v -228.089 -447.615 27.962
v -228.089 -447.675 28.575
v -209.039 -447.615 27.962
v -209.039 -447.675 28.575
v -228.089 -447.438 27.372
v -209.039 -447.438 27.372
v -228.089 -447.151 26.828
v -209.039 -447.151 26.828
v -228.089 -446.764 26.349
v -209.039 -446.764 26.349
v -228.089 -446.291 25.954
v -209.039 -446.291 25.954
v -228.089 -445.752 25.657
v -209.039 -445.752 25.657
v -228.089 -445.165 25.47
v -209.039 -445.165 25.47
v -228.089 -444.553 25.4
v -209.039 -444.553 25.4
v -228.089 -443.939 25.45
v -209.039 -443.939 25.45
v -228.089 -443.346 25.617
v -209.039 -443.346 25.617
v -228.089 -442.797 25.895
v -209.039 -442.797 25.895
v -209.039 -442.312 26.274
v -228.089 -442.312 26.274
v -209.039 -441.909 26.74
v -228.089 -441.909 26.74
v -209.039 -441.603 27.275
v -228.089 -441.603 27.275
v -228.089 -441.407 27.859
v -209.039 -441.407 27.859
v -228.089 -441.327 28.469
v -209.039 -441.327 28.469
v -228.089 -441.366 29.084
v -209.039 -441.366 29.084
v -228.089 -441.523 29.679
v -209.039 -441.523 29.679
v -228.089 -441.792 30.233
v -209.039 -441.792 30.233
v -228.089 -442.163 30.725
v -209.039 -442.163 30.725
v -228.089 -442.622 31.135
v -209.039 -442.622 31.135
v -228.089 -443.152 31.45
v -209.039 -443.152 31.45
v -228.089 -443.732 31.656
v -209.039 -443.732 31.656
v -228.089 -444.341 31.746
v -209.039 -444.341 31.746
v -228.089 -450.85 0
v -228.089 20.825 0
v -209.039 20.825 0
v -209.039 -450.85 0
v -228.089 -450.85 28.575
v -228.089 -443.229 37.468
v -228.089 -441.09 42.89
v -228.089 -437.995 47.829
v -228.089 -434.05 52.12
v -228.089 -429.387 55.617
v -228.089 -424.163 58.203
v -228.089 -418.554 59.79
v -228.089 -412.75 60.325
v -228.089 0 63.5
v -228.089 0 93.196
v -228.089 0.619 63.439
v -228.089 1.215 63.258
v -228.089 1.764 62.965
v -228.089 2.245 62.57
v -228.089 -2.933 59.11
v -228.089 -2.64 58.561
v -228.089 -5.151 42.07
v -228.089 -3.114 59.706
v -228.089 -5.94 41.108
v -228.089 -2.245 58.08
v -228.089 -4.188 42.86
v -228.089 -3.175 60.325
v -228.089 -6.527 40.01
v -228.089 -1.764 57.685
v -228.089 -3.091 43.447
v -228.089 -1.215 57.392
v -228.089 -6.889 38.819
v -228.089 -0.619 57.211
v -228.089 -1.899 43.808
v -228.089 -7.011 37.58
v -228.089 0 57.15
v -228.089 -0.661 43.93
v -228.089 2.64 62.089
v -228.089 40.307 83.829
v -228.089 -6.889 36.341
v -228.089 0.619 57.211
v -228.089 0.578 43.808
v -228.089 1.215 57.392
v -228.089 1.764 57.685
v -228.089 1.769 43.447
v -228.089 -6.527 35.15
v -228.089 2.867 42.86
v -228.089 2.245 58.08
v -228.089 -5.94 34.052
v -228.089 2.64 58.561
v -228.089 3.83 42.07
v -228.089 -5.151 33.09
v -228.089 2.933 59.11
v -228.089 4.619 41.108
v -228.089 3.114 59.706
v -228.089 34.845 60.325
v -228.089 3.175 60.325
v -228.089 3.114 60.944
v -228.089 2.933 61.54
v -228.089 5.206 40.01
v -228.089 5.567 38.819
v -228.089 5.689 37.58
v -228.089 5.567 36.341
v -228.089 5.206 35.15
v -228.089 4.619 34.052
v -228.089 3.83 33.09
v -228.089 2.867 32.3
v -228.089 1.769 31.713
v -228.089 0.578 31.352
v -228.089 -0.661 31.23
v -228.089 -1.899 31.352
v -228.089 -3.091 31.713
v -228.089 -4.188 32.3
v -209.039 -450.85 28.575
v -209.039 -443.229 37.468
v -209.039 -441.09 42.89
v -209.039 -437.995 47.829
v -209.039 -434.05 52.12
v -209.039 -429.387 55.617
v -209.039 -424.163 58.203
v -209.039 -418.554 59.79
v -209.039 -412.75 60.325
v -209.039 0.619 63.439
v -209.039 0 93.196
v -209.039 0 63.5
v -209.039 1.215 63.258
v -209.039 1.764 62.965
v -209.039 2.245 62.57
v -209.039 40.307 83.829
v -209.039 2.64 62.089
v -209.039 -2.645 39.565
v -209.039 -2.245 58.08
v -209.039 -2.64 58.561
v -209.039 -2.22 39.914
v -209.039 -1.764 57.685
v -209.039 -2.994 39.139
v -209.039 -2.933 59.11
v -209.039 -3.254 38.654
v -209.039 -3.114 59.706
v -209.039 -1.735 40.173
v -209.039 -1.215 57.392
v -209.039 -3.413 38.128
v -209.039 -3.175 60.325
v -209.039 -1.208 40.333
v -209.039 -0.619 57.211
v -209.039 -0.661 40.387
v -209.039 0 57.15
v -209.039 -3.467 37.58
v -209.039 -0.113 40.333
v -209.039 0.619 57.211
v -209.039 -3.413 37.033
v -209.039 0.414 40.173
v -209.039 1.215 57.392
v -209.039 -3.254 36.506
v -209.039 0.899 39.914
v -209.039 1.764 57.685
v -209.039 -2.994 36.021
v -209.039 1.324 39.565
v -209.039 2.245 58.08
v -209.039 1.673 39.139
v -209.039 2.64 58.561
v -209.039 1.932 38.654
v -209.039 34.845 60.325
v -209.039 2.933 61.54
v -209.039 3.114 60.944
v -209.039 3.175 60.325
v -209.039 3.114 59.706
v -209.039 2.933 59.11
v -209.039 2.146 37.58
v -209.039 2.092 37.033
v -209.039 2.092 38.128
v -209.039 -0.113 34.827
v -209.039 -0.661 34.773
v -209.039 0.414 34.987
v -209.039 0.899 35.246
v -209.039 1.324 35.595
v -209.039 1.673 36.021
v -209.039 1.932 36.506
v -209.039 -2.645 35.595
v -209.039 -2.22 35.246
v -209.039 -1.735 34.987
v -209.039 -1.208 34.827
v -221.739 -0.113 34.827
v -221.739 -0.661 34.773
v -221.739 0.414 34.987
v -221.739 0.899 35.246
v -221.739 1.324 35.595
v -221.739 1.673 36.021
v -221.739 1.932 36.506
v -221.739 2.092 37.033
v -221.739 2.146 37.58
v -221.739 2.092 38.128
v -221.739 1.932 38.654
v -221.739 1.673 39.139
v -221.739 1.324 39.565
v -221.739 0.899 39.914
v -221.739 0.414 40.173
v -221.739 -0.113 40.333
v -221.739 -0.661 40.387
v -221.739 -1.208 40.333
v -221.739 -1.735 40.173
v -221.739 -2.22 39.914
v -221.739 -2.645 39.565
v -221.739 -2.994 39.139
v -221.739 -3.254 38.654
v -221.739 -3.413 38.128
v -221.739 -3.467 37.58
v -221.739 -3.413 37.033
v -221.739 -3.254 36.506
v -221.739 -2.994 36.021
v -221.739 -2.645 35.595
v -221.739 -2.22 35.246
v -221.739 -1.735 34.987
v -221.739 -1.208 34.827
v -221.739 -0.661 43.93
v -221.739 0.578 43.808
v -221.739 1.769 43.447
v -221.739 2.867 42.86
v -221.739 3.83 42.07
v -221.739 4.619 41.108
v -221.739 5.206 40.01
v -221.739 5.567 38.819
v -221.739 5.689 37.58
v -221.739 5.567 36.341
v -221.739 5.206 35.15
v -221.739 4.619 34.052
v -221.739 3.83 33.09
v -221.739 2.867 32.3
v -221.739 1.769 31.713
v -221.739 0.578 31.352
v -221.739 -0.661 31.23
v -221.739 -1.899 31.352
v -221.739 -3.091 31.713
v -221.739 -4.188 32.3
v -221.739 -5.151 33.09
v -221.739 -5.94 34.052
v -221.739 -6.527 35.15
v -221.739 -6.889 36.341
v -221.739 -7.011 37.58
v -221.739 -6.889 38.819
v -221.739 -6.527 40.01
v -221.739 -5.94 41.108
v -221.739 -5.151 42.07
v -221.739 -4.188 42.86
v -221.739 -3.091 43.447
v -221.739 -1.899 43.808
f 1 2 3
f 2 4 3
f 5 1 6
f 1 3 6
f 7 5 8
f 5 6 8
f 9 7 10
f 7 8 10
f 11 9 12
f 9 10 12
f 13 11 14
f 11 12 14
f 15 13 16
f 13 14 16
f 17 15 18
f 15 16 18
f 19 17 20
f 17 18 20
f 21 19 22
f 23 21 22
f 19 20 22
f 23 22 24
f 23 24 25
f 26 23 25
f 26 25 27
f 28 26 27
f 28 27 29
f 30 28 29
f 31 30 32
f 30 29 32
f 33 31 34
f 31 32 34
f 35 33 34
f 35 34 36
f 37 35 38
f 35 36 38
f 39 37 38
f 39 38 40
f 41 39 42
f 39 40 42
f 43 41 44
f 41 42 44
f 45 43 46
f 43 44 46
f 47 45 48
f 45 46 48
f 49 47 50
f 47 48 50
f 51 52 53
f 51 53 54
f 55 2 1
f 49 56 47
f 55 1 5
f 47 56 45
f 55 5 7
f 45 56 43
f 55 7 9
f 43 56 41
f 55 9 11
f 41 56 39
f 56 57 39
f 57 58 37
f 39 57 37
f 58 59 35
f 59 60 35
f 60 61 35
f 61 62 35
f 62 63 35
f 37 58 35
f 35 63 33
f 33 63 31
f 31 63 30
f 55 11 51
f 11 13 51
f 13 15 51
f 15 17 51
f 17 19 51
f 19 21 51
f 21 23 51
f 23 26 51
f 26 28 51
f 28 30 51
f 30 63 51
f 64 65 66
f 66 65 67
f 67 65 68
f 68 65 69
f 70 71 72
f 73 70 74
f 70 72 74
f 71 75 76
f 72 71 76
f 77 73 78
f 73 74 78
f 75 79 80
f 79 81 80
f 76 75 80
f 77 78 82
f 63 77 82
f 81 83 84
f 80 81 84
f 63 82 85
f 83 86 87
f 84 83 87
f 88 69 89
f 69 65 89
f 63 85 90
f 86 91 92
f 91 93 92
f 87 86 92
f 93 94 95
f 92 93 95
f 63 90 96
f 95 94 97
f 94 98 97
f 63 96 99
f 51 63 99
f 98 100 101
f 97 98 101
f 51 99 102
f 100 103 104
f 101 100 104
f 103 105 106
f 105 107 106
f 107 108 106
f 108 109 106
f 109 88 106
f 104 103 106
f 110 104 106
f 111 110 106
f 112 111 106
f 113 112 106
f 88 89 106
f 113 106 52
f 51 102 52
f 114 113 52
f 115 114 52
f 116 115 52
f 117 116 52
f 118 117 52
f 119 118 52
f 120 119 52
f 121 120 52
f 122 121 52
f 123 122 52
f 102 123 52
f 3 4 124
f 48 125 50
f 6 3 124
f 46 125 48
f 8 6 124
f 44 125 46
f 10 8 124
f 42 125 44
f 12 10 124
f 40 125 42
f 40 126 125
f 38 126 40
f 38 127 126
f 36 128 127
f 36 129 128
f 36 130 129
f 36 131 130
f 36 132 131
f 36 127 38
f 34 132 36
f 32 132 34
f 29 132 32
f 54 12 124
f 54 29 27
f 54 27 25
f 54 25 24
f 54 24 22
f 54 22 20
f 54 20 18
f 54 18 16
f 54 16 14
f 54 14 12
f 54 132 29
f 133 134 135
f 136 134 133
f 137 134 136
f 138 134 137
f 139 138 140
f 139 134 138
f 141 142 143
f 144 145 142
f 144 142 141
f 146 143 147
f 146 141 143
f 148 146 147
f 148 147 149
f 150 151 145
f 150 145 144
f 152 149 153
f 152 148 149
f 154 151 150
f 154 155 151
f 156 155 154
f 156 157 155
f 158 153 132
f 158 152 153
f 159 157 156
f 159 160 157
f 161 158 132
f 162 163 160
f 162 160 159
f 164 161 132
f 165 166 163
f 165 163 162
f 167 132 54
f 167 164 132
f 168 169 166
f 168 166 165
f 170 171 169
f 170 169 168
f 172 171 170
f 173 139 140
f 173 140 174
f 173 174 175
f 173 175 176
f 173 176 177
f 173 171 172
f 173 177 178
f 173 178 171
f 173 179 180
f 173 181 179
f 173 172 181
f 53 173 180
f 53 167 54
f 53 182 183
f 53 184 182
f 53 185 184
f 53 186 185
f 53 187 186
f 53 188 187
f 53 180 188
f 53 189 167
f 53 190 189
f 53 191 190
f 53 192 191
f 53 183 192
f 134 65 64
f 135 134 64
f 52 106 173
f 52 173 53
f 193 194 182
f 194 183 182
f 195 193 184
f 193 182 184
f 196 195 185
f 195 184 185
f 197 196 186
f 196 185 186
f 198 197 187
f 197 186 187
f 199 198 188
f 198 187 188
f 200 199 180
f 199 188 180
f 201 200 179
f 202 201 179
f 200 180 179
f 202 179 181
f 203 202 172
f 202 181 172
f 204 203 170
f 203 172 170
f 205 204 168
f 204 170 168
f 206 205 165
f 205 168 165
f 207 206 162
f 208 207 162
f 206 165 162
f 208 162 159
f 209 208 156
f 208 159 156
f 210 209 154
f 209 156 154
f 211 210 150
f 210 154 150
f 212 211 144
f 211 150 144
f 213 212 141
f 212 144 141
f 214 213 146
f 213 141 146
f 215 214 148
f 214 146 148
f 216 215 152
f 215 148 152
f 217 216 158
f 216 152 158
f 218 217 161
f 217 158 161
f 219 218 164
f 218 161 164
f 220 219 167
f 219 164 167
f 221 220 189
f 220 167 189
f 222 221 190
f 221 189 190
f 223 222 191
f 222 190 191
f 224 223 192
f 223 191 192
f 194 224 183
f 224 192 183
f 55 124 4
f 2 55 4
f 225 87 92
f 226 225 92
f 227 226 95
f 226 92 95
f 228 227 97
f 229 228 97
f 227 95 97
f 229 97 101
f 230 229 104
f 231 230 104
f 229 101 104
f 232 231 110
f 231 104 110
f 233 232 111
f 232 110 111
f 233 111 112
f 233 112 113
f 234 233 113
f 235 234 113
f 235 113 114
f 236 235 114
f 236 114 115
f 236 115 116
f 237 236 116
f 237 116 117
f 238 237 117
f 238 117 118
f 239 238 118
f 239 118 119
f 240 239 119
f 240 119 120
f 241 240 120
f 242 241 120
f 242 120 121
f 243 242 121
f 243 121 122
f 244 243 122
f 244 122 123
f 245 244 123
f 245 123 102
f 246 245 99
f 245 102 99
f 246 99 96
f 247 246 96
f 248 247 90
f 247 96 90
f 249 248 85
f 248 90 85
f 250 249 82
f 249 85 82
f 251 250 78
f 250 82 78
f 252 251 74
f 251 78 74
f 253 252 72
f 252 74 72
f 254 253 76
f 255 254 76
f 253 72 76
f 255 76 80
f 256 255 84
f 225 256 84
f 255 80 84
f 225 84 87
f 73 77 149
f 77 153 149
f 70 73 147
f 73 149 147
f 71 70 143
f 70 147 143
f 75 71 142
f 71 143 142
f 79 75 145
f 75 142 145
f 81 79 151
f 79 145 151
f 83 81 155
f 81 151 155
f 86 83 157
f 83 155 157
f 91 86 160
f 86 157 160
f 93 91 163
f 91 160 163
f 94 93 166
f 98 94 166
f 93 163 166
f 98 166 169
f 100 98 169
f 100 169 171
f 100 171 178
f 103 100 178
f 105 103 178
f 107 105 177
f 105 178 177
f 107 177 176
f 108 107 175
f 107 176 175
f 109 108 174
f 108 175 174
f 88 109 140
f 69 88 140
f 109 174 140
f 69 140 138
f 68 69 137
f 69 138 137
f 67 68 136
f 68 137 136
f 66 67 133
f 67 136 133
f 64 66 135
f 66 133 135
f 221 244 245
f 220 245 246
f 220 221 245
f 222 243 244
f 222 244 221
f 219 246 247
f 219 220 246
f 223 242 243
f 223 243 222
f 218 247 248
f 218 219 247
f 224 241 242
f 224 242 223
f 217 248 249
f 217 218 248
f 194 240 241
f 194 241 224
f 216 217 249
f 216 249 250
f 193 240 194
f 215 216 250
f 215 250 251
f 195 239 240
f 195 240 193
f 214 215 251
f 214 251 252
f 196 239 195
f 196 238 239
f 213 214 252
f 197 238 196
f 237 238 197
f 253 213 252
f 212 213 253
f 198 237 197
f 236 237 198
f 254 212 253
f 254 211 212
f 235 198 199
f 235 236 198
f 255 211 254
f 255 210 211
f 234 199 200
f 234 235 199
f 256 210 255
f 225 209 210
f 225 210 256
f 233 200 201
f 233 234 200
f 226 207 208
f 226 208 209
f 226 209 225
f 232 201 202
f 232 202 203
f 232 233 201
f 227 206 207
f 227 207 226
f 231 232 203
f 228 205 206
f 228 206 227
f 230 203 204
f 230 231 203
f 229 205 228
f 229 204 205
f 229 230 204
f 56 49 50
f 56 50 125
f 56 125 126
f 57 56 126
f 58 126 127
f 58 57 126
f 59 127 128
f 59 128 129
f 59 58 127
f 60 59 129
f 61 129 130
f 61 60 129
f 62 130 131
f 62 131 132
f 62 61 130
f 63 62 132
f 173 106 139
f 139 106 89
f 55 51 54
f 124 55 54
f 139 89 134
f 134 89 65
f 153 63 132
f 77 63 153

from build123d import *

# Parameters (mm, degrees)
SKETCH1_W                                        = 19.05
SKETCH1_H                                        = 450.85
BOSS_EXTRUDE1_DEPTH                              = 66.675
FILLET4_R                                        = 38.1
CUT_EXTRUDE1_REACH                               = 458.151
BOSS_EXTRUDE2_DEPTH                              = 19.05
BOSS_EXTRUDE3_DEPTH                              = 19.05
F_1_4_0_25_DIAMETER_HOLE1_D                      = 6.35
F_10_CLEARANCE_HOLE_WITH_1_0_X_25_CB_D           = 5.6134
F_10_CLEARANCE_HOLE_WITH_1_0_X_25_CB_CBORE_D     = 12.7
F_10_CLEARANCE_HOLE_WITH_1_0_X_25_CB_CBORE_DEPTH = 6.35


with BuildPart() as part:
    # Sketch1 → Boss-Extrude1 (new body)
    with BuildSketch(Plane.XY):
        with Locations((-218.563766336, -225.425)):
            Rectangle(SKETCH1_W, SKETCH1_H)
    extrude(amount=BOSS_EXTRUDE1_DEPTH)

    # Fillet4
    fillet4_edges = [part.edges().sort_by_distance(p)[0] for p in [
        (-218.563766336, -450.85, 66.675),
    ]]
    fillet(fillet4_edges, radius=FILLET4_R)

    # Sketch4 → Cut-Extrude1 (cut, up to next)
    with BuildSketch(Plane.ZY.offset(228.088766336), mode=Mode.PRIVATE) as cut_extrude1_sk1:
        with BuildLine():
            Line((66.675, 0), (66.675, -412.75))
            ThreePointArc((66.675, -412.75), (55.515768363, -439.690768363), (28.575, -450.85))
            Line((28.575, -450.85), (28.575, -444.5))
            ThreePointArc((28.575, -444.5), (51.025640303, -435.200640303), (60.325, -412.75))
            Line((60.325, -412.75), (60.325, 0))
            Line((60.325, 0), (66.675, 0))
        make_face()
    cut_extrude1_tool1 = extrude(cut_extrude1_sk1.sketch, amount=-CUT_EXTRUDE1_REACH, mode=Mode.PRIVATE) & part.part
    add(cut_extrude1_tool1.solids().sort_by_distance((-228.088766, -233.202612, 62.01827))[0], mode=Mode.SUBTRACT)

    # Sketch7 → Boss-Extrude2 (add, through all)
    with BuildSketch(Plane.ZY.offset(228.088766336)):
        Polygon((0, 0), (60.325, 0), (60.325, 34.844553242), (0, 20.824633003), align=None)
    extrude(amount=-BOSS_EXTRUDE2_DEPTH)

    # Sketch8 → Boss-Extrude3 (add, through all)
    with BuildSketch(Plane.ZY.offset(228.088766336)):
        Polygon((60.325, 34.844553242), (83.828599938, 40.306941911), (93.196193981, 0), (60.325, 0), align=None)
    extrude(amount=-BOSS_EXTRUDE3_DEPTH)

    # 1/4 (0.25) Diameter Hole1 (through all)
    with Locations(Plane.ZY.offset(228.088766336)):
        with Locations((28.575, -444.5), (60.325, 0)):
            Hole(F_1_4_0_25_DIAMETER_HOLE1_D / 2)

    # #10 Clearance Hole with 1.0 x .25 CB (through all)
    with Locations(Plane.ZY.offset(228.088766336)):
        with Locations((37.58012522, -0.660555349)):
            CounterBoreHole(F_10_CLEARANCE_HOLE_WITH_1_0_X_25_CB_D / 2, F_10_CLEARANCE_HOLE_WITH_1_0_X_25_CB_CBORE_D / 2, F_10_CLEARANCE_HOLE_WITH_1_0_X_25_CB_CBORE_DEPTH)


solid = part.part
